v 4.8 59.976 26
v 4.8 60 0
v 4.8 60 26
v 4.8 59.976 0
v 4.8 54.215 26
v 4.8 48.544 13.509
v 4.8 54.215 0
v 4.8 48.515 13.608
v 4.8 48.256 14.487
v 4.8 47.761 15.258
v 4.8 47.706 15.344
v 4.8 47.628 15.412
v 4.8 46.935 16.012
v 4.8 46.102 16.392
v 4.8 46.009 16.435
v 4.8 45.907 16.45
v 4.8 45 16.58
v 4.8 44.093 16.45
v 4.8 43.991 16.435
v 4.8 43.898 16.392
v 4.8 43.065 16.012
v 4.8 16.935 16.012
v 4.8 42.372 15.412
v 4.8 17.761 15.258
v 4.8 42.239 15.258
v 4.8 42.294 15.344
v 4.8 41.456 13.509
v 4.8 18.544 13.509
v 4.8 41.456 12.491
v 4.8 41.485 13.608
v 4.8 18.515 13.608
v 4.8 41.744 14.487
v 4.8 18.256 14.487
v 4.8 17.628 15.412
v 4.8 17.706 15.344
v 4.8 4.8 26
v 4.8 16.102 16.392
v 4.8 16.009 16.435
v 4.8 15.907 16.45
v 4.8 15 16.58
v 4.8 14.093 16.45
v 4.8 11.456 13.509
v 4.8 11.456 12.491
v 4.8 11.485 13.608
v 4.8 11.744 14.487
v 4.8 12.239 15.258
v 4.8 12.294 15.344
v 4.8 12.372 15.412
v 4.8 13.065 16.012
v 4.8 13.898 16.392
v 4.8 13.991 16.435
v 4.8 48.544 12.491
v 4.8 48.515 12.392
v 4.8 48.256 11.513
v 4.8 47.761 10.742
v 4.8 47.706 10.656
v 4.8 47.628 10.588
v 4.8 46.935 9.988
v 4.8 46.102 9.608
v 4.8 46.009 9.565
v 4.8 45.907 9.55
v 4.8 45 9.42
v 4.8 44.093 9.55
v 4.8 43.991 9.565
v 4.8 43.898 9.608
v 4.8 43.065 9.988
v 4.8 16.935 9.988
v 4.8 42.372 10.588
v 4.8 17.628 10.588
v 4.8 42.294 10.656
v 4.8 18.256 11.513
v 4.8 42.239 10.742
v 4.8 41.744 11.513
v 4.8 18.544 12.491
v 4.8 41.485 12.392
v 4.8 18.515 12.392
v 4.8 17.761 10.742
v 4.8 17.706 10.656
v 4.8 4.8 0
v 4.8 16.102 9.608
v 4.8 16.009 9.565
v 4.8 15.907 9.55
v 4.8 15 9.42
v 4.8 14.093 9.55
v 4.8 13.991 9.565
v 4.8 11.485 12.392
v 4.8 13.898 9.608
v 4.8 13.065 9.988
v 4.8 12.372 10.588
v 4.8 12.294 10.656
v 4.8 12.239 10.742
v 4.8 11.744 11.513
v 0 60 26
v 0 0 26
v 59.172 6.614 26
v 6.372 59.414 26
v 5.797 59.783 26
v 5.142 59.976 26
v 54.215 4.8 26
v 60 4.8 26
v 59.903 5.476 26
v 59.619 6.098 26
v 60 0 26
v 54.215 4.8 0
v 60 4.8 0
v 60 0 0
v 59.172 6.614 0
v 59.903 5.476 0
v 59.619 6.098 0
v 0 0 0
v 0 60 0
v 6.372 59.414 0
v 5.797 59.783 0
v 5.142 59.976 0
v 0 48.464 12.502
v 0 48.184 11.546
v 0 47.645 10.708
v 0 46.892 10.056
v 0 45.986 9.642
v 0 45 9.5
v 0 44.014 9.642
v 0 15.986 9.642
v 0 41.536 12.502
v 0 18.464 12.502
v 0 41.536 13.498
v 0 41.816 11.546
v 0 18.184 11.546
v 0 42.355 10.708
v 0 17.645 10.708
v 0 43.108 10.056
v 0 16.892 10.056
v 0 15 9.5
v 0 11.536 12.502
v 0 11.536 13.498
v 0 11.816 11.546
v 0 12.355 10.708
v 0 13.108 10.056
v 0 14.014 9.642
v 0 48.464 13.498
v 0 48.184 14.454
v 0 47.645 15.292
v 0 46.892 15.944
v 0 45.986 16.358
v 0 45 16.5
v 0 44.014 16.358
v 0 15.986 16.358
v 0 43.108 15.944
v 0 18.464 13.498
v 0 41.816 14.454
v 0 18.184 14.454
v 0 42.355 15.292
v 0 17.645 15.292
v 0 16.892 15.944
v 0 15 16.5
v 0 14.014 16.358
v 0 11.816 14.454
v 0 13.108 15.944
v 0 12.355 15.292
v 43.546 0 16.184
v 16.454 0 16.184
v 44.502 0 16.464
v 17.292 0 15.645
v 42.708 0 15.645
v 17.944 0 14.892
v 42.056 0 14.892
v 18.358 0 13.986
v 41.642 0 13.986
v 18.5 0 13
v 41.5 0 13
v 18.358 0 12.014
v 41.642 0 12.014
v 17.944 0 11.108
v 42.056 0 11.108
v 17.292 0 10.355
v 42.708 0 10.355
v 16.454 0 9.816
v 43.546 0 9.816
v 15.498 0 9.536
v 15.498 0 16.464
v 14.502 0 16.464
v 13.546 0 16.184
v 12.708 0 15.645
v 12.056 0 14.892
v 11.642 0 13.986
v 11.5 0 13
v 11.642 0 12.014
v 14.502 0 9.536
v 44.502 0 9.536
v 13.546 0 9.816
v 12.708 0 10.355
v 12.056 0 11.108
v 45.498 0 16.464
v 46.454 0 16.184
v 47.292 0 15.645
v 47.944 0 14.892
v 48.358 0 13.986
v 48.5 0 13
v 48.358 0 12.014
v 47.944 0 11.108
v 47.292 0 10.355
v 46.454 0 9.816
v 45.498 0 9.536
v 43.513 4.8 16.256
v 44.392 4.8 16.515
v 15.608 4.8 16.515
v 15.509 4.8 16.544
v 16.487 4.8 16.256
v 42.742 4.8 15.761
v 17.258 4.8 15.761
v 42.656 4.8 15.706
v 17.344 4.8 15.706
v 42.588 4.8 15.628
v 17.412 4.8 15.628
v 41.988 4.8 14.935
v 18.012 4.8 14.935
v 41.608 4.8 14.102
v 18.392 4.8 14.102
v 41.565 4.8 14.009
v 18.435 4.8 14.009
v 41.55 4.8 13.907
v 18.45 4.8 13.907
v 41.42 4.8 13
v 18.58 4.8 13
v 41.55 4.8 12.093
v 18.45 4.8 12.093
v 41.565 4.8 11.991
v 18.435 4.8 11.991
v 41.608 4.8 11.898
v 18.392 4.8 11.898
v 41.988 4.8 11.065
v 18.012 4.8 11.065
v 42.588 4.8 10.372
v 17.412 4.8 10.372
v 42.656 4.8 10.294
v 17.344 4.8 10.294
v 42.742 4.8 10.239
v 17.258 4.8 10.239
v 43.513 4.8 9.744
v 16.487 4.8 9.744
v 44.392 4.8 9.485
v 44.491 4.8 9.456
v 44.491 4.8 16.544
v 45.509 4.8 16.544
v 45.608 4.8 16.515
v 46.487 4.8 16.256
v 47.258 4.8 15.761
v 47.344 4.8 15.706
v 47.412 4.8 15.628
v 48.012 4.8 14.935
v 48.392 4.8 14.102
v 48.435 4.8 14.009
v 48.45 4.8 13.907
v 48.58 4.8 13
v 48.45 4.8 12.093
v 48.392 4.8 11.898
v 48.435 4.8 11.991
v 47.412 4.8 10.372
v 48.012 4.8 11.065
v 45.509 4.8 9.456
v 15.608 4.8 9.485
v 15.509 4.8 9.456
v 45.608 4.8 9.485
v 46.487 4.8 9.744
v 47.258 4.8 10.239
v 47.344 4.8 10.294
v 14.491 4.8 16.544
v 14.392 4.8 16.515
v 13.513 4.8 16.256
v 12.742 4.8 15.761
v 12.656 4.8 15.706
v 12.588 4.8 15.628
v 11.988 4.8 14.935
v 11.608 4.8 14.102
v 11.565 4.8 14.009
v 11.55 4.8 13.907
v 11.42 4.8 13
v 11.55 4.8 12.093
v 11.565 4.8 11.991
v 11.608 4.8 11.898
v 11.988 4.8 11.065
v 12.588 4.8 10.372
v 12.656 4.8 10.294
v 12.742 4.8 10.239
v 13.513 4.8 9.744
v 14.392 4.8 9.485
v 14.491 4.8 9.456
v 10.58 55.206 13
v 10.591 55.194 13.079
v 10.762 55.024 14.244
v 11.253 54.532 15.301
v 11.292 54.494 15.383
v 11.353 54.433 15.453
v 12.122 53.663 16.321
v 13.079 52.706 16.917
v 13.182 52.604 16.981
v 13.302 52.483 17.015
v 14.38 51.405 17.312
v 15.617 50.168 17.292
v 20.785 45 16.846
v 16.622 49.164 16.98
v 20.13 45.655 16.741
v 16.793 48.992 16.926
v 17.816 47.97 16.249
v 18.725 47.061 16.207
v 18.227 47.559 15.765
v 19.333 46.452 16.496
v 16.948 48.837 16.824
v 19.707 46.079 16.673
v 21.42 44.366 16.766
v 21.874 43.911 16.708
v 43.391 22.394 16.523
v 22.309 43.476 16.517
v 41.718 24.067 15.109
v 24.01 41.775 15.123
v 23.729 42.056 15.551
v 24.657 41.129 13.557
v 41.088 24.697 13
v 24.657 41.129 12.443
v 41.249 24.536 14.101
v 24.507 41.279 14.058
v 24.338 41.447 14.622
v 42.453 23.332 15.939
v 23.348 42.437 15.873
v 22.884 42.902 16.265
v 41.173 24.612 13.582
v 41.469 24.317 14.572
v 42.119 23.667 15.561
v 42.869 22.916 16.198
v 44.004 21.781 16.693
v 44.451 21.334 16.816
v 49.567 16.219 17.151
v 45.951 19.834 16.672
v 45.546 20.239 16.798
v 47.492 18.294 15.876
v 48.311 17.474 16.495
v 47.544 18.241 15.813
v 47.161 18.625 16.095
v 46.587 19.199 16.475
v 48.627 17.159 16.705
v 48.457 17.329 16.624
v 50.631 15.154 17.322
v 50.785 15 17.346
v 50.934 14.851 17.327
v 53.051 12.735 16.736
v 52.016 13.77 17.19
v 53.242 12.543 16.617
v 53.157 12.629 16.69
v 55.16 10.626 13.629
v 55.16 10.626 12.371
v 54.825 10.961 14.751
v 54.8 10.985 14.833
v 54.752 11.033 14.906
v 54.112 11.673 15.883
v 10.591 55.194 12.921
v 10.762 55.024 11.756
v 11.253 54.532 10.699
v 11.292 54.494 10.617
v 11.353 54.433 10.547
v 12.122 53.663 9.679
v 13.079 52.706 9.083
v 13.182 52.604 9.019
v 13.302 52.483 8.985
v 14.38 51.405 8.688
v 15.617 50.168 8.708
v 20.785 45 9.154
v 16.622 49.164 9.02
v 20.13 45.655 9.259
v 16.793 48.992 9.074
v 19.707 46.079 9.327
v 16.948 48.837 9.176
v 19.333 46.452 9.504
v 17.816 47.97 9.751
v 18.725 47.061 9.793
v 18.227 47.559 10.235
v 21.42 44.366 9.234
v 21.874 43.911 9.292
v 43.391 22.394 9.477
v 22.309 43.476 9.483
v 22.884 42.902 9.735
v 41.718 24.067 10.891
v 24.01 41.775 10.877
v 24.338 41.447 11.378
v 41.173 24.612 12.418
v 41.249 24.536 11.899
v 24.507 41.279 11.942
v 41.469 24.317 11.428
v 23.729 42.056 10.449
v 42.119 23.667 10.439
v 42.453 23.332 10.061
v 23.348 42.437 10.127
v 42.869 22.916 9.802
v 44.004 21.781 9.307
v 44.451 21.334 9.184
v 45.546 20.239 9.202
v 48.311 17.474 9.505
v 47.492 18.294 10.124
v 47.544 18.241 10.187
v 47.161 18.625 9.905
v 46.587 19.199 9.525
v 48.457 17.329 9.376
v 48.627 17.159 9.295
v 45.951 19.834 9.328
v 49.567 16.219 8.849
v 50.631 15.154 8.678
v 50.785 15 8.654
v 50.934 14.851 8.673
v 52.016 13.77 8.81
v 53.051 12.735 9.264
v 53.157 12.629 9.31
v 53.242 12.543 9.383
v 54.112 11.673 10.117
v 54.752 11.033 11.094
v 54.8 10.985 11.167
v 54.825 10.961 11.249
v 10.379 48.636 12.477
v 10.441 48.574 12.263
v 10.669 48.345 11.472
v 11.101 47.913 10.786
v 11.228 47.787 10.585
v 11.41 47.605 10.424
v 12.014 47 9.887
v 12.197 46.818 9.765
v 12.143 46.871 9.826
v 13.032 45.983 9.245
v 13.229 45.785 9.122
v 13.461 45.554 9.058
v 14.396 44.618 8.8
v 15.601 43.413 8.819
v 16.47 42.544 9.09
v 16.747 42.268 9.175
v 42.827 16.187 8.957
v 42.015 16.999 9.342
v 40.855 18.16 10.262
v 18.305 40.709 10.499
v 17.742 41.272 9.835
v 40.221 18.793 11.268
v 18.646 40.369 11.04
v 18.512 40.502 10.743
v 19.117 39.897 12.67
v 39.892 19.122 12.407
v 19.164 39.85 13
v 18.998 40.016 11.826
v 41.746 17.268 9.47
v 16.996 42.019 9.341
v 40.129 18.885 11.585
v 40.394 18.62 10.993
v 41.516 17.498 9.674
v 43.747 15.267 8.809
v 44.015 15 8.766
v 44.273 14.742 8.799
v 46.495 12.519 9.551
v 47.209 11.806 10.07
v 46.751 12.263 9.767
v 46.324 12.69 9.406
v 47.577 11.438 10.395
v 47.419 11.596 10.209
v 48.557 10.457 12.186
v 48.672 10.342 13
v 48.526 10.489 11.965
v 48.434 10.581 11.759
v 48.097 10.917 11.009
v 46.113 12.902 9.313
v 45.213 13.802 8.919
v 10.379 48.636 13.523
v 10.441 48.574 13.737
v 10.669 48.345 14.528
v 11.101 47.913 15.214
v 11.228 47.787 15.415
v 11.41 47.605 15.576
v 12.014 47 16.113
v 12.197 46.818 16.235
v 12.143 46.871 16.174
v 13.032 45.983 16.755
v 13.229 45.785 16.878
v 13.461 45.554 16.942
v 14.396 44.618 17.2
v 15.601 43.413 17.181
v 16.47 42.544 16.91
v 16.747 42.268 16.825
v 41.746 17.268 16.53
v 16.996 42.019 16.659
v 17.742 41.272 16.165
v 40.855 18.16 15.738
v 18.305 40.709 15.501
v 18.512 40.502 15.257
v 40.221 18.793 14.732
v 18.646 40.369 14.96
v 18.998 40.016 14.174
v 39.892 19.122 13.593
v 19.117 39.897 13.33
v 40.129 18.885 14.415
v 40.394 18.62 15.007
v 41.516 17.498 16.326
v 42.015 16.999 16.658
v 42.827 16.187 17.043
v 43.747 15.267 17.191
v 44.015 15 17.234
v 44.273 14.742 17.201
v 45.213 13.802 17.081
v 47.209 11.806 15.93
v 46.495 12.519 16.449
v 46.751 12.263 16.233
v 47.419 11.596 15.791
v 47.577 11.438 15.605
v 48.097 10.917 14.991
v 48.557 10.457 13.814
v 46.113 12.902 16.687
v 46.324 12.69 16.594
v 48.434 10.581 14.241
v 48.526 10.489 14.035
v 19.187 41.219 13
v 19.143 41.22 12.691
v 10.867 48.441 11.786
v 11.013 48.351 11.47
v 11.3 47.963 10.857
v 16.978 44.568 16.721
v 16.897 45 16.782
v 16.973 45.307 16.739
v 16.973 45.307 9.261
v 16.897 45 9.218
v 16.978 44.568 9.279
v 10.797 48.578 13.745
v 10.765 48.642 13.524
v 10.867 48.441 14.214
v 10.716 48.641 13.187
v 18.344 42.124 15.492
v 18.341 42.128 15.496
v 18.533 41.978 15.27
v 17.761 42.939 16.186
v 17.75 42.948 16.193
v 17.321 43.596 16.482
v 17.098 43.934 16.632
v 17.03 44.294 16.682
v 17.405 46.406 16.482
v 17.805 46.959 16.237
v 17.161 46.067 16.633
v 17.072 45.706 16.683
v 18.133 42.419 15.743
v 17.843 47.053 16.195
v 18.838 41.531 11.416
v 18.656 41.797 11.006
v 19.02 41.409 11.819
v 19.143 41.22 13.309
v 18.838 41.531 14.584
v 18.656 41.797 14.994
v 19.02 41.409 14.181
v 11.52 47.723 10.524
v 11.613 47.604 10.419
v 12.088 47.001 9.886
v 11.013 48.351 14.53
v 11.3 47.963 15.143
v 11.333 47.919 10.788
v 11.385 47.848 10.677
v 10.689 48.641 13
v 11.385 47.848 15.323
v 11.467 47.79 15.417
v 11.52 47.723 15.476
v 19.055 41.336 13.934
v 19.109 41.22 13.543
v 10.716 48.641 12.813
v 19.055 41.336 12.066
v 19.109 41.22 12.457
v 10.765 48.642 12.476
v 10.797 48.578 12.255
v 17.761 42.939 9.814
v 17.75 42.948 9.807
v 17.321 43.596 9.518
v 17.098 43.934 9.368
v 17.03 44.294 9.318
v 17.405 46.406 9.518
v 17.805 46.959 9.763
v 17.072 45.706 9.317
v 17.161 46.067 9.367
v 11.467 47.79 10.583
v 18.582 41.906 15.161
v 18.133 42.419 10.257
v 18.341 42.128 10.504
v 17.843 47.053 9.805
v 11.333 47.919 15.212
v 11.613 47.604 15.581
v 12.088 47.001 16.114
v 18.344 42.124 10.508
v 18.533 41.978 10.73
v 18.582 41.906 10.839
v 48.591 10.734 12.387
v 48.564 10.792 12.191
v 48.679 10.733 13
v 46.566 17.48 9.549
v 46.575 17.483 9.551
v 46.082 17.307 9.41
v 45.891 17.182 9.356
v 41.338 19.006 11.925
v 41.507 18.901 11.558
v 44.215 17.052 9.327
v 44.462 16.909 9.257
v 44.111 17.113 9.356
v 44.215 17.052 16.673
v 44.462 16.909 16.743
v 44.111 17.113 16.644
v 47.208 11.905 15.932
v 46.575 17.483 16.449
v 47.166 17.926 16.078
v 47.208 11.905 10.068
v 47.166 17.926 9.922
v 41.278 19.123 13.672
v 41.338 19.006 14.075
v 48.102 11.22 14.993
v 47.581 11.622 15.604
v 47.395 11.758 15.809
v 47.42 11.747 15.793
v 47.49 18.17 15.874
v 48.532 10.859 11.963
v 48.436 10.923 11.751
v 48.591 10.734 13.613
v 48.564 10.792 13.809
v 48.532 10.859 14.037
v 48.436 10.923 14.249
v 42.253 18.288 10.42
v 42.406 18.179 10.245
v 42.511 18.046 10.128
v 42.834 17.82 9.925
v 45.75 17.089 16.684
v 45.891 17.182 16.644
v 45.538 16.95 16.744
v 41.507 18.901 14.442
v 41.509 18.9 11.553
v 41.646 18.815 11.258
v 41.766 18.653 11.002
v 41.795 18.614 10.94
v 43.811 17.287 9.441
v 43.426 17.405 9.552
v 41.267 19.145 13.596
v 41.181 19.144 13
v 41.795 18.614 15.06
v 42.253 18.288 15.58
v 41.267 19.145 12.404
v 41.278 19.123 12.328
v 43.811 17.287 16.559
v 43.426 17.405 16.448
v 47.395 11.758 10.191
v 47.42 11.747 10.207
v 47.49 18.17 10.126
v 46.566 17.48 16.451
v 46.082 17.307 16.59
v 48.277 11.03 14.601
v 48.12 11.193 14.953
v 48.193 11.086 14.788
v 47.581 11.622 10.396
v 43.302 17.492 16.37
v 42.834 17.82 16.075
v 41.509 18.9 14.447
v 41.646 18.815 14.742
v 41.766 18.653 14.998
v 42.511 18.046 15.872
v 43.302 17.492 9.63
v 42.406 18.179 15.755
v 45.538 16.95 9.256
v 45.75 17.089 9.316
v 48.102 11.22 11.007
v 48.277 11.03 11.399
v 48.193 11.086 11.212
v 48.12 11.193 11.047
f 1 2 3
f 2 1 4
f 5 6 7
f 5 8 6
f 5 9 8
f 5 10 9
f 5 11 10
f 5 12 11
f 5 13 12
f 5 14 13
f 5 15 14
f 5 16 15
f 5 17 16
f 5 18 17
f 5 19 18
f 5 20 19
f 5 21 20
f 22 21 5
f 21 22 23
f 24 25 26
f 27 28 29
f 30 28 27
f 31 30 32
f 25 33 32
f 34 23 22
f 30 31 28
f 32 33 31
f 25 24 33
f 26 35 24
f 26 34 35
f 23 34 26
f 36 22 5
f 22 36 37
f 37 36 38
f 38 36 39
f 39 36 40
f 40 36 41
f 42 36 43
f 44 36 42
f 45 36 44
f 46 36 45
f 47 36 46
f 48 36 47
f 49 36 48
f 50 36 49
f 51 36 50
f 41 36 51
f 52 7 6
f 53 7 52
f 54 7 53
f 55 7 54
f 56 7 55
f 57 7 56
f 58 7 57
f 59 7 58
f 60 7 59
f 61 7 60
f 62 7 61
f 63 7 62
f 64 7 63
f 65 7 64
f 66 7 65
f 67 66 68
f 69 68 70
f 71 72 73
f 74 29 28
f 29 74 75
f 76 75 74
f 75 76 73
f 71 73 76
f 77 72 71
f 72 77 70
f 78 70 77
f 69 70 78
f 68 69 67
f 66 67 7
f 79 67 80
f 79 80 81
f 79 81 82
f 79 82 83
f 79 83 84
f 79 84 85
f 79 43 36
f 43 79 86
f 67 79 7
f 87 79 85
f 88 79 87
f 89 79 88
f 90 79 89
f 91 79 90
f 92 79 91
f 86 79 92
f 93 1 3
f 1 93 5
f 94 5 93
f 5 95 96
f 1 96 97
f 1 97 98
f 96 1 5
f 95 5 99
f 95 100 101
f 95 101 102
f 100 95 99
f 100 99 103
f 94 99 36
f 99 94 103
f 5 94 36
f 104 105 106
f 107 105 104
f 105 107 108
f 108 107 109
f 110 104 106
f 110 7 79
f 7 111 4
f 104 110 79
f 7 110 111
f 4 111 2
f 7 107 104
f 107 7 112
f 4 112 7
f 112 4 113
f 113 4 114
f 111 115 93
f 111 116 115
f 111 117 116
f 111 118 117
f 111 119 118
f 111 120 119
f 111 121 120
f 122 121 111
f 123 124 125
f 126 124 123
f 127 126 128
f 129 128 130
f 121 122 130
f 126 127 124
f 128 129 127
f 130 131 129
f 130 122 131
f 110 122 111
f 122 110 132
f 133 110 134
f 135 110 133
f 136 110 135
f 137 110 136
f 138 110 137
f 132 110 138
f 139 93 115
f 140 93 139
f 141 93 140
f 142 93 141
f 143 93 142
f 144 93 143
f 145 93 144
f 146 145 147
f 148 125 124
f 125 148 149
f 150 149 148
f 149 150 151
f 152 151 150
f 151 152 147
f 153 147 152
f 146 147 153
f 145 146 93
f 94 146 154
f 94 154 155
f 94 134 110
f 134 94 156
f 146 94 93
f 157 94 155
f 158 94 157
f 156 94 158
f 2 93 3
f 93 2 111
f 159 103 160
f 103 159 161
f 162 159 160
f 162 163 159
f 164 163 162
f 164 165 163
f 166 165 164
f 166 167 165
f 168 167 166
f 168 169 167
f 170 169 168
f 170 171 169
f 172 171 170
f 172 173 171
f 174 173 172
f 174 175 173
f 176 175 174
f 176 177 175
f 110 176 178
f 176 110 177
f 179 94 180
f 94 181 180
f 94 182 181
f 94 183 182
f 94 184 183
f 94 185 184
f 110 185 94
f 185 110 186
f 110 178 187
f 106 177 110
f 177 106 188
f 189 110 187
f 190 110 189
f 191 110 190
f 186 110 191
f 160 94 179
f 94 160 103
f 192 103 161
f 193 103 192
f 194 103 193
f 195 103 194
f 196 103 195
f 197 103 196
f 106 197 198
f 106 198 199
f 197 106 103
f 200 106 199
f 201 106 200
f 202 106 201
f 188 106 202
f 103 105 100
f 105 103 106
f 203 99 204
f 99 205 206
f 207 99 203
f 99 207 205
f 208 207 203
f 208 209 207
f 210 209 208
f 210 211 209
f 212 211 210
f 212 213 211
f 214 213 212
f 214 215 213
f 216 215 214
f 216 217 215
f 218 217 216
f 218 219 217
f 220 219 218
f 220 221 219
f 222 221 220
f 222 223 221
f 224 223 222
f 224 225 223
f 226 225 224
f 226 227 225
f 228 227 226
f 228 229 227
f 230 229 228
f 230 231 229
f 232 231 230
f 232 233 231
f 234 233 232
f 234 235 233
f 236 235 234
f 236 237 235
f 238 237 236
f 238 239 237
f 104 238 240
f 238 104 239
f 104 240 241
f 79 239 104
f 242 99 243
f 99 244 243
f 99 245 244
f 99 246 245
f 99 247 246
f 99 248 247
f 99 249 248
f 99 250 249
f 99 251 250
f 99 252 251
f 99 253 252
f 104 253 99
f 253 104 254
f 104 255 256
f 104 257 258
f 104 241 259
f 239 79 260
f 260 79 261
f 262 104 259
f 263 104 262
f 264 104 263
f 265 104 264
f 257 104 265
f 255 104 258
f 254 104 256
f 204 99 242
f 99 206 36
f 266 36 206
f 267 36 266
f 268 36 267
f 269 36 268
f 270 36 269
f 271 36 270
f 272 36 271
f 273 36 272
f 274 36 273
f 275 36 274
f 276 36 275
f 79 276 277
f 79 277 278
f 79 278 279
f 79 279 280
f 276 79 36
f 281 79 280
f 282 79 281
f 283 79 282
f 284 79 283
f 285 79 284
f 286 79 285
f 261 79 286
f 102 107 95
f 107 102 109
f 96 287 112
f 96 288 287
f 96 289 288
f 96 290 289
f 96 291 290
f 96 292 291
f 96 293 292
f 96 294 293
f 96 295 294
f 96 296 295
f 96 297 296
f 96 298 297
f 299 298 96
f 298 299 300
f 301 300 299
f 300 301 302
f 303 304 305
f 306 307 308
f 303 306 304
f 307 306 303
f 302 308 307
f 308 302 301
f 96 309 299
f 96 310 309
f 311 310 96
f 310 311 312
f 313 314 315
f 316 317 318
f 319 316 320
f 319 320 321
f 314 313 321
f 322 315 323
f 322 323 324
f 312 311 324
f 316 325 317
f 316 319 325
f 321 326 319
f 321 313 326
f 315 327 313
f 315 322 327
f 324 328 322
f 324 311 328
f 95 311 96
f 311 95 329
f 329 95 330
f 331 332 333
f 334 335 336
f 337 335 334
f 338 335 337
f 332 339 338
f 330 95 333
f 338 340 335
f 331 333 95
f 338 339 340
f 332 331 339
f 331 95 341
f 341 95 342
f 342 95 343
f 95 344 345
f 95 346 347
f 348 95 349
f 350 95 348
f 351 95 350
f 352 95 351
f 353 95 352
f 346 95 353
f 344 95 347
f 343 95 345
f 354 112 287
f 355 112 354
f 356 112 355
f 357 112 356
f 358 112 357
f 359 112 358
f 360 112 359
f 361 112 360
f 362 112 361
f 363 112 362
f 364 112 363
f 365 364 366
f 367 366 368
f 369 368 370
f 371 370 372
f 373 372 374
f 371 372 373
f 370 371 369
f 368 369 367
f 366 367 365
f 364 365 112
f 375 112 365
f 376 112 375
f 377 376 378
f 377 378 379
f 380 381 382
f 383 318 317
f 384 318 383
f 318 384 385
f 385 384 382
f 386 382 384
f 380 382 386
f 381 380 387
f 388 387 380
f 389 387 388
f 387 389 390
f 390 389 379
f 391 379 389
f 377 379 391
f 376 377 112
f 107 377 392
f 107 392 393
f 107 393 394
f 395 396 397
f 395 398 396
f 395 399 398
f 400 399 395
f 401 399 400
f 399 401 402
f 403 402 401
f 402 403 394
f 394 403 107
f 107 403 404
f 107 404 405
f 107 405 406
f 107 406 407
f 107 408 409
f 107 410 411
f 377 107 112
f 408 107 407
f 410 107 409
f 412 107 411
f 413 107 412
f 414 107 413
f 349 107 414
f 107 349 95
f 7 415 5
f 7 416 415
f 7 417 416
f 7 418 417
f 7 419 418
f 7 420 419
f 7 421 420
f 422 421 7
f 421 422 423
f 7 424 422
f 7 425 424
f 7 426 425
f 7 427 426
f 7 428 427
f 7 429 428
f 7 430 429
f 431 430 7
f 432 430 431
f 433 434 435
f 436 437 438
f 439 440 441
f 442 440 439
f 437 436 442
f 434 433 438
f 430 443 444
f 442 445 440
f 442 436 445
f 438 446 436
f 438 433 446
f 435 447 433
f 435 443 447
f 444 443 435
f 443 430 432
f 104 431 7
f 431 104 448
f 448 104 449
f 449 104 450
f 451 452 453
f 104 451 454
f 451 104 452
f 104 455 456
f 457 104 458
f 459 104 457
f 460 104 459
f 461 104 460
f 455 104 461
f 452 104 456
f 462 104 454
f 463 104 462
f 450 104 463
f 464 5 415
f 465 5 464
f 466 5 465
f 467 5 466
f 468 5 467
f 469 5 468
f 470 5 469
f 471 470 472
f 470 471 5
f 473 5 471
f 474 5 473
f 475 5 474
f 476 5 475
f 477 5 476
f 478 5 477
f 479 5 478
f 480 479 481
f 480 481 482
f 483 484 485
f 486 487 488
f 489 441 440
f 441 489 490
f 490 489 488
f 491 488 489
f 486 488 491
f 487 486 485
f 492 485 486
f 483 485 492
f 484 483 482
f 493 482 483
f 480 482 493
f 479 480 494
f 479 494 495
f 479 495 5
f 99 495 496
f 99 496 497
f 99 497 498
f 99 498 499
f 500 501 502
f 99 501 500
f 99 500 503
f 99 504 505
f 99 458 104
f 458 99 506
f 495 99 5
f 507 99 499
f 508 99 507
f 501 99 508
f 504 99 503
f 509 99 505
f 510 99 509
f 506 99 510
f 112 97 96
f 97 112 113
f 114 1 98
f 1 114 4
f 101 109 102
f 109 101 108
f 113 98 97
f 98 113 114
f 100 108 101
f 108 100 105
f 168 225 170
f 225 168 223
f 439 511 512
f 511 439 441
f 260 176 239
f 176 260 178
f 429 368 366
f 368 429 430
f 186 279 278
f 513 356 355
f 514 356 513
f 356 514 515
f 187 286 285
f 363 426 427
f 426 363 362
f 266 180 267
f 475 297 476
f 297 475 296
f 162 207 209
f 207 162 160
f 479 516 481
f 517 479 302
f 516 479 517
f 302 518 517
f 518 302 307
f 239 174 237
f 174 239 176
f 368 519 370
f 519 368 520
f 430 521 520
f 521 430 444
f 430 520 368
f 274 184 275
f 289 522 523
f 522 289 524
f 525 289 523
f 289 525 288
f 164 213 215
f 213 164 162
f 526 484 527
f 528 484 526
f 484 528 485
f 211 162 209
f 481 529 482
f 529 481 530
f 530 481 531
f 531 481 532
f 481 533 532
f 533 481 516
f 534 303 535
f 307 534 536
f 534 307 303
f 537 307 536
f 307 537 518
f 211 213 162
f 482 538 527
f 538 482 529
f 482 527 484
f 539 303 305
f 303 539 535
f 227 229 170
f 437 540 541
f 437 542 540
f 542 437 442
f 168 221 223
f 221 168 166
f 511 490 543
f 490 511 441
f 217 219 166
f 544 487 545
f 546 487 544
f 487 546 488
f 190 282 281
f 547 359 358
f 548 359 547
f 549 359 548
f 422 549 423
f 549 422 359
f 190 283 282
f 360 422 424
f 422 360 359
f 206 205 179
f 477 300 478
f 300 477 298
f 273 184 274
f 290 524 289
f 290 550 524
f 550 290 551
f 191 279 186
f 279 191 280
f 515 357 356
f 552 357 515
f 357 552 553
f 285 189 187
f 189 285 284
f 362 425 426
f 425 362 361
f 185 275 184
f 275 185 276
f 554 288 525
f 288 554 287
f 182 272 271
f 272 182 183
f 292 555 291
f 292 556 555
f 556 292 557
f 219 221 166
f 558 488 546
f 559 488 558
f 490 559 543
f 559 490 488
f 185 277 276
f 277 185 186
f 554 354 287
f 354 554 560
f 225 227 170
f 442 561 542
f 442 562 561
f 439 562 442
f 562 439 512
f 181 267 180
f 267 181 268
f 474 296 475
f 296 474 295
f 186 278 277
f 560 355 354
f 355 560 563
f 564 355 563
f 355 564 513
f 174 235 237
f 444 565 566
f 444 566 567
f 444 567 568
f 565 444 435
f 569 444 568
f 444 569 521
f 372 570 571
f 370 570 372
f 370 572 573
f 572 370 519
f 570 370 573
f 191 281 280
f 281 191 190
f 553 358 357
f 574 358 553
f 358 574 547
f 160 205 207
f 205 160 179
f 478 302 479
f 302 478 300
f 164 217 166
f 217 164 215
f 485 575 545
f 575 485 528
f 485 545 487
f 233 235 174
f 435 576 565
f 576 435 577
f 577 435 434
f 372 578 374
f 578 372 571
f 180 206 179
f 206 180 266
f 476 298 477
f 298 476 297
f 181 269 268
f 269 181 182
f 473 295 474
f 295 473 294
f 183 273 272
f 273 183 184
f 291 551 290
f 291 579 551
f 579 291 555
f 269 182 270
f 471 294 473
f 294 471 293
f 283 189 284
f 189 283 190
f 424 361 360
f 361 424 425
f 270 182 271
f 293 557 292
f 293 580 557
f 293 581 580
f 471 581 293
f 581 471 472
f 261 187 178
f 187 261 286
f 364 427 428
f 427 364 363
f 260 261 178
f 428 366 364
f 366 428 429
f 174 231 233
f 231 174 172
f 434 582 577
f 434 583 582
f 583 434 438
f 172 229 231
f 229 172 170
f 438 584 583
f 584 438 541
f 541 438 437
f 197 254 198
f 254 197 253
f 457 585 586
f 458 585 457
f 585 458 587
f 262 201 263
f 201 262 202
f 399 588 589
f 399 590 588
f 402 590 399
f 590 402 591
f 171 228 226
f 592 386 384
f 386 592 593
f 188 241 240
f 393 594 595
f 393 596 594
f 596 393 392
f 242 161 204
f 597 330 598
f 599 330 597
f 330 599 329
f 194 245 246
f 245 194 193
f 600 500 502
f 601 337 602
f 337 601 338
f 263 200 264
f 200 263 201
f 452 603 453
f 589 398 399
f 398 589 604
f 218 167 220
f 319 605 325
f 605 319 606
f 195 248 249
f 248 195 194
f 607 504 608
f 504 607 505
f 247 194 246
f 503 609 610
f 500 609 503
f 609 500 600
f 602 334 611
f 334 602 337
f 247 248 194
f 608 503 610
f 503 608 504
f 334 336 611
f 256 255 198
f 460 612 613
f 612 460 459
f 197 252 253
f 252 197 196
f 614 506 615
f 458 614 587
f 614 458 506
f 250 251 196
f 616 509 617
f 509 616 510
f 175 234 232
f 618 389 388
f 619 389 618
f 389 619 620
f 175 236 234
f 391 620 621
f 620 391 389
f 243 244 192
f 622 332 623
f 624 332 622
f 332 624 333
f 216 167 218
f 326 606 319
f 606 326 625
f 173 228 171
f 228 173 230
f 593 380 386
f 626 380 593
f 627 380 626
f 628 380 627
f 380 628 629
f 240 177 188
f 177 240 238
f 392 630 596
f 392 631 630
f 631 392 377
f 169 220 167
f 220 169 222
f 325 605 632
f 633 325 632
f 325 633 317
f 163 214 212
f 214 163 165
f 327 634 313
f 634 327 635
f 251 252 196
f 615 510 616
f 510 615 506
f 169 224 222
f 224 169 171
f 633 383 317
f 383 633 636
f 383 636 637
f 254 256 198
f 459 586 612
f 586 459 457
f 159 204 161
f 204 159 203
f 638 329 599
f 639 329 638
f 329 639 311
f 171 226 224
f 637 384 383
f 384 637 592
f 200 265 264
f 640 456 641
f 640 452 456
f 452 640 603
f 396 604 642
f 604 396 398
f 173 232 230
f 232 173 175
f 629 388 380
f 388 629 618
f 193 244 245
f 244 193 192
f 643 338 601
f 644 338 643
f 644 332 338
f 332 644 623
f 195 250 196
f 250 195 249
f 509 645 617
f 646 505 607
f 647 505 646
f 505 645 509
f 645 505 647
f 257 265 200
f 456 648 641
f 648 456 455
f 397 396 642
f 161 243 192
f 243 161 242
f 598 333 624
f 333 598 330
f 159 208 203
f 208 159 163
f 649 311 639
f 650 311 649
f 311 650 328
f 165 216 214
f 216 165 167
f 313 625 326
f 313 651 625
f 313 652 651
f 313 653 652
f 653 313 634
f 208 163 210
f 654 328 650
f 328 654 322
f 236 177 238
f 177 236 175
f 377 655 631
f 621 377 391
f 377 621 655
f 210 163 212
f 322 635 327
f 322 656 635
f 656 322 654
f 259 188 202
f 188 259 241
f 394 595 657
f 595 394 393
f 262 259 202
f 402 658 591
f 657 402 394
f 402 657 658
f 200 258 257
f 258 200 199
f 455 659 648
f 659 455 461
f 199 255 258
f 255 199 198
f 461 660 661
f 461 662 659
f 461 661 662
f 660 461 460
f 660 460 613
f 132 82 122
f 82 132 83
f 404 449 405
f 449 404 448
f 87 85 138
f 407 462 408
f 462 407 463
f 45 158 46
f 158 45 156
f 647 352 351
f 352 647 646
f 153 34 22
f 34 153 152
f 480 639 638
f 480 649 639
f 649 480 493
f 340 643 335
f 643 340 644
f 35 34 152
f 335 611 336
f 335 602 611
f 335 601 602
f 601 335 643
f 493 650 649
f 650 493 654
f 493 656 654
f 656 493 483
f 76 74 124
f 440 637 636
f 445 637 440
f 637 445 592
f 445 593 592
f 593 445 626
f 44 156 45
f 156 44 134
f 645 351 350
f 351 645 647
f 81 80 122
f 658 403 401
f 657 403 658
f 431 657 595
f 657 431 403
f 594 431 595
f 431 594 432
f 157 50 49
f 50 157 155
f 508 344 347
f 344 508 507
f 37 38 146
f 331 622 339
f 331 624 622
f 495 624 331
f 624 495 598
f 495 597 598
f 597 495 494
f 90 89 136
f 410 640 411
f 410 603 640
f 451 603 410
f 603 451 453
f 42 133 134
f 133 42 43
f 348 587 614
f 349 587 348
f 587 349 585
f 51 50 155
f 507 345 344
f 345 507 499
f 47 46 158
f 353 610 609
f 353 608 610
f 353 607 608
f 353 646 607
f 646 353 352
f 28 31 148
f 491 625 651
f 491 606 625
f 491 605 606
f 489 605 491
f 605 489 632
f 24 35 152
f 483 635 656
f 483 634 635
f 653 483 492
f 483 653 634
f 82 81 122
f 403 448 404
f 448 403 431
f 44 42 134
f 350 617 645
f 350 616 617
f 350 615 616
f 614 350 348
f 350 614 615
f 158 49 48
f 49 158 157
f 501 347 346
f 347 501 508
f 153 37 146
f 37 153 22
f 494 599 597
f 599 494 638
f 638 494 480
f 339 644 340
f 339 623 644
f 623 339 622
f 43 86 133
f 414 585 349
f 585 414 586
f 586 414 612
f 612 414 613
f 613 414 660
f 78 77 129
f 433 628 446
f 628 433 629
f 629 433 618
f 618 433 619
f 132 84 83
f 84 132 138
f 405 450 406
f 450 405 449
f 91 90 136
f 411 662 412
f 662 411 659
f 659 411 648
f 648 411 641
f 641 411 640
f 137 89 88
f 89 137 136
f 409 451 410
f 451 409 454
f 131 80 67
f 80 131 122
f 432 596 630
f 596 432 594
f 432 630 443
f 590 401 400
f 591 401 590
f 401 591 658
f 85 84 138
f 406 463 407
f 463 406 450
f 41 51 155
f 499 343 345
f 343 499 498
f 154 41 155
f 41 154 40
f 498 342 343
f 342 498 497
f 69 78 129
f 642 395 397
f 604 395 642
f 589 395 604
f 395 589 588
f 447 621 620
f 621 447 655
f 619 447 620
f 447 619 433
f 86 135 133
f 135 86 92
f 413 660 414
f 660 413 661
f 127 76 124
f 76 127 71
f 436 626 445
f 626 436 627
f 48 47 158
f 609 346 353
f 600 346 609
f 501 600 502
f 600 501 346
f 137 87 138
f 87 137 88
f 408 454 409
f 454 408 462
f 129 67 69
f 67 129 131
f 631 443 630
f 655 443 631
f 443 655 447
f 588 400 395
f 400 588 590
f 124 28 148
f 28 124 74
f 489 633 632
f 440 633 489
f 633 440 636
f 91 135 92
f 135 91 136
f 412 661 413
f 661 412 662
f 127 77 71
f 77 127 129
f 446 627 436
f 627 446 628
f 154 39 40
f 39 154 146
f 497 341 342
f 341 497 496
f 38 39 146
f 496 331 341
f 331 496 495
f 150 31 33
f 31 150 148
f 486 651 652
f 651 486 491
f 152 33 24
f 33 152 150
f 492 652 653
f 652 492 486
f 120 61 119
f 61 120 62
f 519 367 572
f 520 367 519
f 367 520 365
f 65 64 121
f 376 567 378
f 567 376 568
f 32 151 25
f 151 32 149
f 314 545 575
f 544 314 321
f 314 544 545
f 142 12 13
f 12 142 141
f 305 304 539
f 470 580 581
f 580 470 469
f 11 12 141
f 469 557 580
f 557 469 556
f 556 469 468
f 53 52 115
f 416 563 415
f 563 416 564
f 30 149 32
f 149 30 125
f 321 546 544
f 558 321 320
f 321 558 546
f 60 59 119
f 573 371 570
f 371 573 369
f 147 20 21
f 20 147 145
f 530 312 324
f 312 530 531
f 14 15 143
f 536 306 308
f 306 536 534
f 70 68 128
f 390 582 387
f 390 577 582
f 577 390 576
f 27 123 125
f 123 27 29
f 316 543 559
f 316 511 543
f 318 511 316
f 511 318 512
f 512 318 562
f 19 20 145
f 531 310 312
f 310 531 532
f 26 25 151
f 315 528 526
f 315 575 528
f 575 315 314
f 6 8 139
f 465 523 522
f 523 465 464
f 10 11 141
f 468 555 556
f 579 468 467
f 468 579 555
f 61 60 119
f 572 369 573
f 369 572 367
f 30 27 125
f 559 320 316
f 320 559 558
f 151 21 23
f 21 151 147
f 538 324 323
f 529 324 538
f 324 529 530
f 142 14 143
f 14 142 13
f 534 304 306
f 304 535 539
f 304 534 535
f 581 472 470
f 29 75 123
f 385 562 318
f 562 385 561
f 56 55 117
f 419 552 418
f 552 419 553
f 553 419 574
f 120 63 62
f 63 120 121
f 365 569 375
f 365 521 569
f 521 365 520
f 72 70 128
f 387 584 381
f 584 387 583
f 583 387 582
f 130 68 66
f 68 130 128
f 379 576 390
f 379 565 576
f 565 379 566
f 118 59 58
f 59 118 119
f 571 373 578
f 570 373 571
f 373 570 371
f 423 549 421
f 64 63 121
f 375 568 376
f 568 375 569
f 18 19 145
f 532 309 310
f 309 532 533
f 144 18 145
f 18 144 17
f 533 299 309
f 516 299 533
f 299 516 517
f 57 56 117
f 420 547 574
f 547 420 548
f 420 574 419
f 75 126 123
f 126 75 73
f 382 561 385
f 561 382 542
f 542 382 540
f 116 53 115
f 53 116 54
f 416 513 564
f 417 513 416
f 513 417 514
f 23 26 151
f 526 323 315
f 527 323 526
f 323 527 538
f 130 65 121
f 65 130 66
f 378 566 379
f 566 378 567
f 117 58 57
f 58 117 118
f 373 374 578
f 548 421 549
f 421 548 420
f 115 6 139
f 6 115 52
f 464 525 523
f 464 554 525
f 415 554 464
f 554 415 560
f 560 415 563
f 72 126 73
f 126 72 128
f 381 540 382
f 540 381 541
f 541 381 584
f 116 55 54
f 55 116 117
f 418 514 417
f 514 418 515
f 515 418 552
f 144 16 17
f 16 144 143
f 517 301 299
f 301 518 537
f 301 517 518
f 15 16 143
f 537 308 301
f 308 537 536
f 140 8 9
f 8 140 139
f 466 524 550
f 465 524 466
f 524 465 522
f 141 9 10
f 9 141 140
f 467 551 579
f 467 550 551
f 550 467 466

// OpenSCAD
// tslot
// models for tslots used in PrusaDusa

//---------------------------------------
module tslot1(
tol = 0.0,
len = 60,
type = 1
){
    
// 30x30     
if(type==1){
    linear_extrude(height=len)
    difference(){
        offset(r=2.0+tol,$fn=20)
        square([26,26],center=true);
 
        translate([0,12,0])
        square([8.2-tol,8.2-tol],center=true);
        translate([0,-12,0])
        square([8.2-tol,8.2-tol],center=true);
        translate([12,0,0])
        square([8.2-tol,8.2-tol],center=true);
        translate([-12,0,0])
        square([8.2-tol,8.2-tol],center=true);
    }
}
    
// 30x60
if(type==2){
    linear_extrude(height=len)
    difference(){
        offset(r=2.0+tol,$fn=20)
        square([26,56],center=true);
 
        translate([0,27,0])
        square([8.2-tol,8.2-tol],center=true);
        translate([0,-27,0])
        square([8.2-tol,8.2-tol],center=true);
        
        translate([12,15,0])
        square([8.2-tol,8.2-tol],center=true);
        translate([-12,15,0])
        square([8.2-tol,8.2-tol],center=true);

        translate([12,-15,0])
        square([8.2-tol,8.2-tol],center=true);
        translate([-12,-15,0])
        square([8.2-tol,8.2-tol],center=true);
    }
}
    
// 36x60
if(type==3){
    linear_extrude(height=len)
    difference(){
        offset(r=2.0+tol,$fn=20)
        square([56,56],center=true);
 
        translate([15,27,0])
        square([8.2-tol,8.2-tol],center=true);
        translate([15,-27,0])
        square([8.2-tol,8.2-tol],center=true);
        
        translate([-15,27,0])
        square([8.2-tol,8.2-tol],center=true);
        translate([-15,-27,0])
        square([8.2-tol,8.2-tol],center=true);
        
        translate([27,15,0])
        square([8.2-tol,8.2-tol],center=true);
        translate([-27,15,0])
        square([8.2-tol,8.2-tol],center=true);

        translate([27,-15,0])
        square([8.2-tol,8.2-tol],center=true);
        translate([-27,-15,0])
        square([8.2-tol,8.2-tol],center=true);
    }
}
    
}

//--------------------------------------
module tbrace(
tol=0.0,
type=1
){

F2=22;
 
difference(){    
union(){
        cube([4.8,60,26]);
        cube([60,4.8,26]);
    
    hull(){
        translate([60-2.4,4.8,0])
        cylinder(r=2.4,h=26,$fn=F2);
        translate([4.8,60-2.4,0])
        cylinder(r=2.4,h=26,$fn=F2);
    }
}    

        translate([15,0,26/2])
        rotate([-90,0,0])
        cylinder(r1=3.5,r2=4.5,h=60,$fn=F2);
        translate([15+30,0,26/2])
        rotate([-90,0,0])
        cylinder(r1=3.5,r2=4.5,h=60,$fn=F2);

        translate([0,15,26/2])
        rotate([0,90,0])
        cylinder(r1=3.5,r2=4.5,h=60,$fn=F2);
        translate([0,15+30,26/2])
        rotate([0,90,0])
        cylinder(r1=3.5,r2=4.5,h=60,$fn=F2);

}
}

//=======================================

tbrace();

/*
color("cyan")
tslot1(len=70);

color("green")
translate([0,15,0])
tslot1(type=2);

color("red")
translate([15,15,0])
tslot1(type=3,len=50);

*/

//=======================================
